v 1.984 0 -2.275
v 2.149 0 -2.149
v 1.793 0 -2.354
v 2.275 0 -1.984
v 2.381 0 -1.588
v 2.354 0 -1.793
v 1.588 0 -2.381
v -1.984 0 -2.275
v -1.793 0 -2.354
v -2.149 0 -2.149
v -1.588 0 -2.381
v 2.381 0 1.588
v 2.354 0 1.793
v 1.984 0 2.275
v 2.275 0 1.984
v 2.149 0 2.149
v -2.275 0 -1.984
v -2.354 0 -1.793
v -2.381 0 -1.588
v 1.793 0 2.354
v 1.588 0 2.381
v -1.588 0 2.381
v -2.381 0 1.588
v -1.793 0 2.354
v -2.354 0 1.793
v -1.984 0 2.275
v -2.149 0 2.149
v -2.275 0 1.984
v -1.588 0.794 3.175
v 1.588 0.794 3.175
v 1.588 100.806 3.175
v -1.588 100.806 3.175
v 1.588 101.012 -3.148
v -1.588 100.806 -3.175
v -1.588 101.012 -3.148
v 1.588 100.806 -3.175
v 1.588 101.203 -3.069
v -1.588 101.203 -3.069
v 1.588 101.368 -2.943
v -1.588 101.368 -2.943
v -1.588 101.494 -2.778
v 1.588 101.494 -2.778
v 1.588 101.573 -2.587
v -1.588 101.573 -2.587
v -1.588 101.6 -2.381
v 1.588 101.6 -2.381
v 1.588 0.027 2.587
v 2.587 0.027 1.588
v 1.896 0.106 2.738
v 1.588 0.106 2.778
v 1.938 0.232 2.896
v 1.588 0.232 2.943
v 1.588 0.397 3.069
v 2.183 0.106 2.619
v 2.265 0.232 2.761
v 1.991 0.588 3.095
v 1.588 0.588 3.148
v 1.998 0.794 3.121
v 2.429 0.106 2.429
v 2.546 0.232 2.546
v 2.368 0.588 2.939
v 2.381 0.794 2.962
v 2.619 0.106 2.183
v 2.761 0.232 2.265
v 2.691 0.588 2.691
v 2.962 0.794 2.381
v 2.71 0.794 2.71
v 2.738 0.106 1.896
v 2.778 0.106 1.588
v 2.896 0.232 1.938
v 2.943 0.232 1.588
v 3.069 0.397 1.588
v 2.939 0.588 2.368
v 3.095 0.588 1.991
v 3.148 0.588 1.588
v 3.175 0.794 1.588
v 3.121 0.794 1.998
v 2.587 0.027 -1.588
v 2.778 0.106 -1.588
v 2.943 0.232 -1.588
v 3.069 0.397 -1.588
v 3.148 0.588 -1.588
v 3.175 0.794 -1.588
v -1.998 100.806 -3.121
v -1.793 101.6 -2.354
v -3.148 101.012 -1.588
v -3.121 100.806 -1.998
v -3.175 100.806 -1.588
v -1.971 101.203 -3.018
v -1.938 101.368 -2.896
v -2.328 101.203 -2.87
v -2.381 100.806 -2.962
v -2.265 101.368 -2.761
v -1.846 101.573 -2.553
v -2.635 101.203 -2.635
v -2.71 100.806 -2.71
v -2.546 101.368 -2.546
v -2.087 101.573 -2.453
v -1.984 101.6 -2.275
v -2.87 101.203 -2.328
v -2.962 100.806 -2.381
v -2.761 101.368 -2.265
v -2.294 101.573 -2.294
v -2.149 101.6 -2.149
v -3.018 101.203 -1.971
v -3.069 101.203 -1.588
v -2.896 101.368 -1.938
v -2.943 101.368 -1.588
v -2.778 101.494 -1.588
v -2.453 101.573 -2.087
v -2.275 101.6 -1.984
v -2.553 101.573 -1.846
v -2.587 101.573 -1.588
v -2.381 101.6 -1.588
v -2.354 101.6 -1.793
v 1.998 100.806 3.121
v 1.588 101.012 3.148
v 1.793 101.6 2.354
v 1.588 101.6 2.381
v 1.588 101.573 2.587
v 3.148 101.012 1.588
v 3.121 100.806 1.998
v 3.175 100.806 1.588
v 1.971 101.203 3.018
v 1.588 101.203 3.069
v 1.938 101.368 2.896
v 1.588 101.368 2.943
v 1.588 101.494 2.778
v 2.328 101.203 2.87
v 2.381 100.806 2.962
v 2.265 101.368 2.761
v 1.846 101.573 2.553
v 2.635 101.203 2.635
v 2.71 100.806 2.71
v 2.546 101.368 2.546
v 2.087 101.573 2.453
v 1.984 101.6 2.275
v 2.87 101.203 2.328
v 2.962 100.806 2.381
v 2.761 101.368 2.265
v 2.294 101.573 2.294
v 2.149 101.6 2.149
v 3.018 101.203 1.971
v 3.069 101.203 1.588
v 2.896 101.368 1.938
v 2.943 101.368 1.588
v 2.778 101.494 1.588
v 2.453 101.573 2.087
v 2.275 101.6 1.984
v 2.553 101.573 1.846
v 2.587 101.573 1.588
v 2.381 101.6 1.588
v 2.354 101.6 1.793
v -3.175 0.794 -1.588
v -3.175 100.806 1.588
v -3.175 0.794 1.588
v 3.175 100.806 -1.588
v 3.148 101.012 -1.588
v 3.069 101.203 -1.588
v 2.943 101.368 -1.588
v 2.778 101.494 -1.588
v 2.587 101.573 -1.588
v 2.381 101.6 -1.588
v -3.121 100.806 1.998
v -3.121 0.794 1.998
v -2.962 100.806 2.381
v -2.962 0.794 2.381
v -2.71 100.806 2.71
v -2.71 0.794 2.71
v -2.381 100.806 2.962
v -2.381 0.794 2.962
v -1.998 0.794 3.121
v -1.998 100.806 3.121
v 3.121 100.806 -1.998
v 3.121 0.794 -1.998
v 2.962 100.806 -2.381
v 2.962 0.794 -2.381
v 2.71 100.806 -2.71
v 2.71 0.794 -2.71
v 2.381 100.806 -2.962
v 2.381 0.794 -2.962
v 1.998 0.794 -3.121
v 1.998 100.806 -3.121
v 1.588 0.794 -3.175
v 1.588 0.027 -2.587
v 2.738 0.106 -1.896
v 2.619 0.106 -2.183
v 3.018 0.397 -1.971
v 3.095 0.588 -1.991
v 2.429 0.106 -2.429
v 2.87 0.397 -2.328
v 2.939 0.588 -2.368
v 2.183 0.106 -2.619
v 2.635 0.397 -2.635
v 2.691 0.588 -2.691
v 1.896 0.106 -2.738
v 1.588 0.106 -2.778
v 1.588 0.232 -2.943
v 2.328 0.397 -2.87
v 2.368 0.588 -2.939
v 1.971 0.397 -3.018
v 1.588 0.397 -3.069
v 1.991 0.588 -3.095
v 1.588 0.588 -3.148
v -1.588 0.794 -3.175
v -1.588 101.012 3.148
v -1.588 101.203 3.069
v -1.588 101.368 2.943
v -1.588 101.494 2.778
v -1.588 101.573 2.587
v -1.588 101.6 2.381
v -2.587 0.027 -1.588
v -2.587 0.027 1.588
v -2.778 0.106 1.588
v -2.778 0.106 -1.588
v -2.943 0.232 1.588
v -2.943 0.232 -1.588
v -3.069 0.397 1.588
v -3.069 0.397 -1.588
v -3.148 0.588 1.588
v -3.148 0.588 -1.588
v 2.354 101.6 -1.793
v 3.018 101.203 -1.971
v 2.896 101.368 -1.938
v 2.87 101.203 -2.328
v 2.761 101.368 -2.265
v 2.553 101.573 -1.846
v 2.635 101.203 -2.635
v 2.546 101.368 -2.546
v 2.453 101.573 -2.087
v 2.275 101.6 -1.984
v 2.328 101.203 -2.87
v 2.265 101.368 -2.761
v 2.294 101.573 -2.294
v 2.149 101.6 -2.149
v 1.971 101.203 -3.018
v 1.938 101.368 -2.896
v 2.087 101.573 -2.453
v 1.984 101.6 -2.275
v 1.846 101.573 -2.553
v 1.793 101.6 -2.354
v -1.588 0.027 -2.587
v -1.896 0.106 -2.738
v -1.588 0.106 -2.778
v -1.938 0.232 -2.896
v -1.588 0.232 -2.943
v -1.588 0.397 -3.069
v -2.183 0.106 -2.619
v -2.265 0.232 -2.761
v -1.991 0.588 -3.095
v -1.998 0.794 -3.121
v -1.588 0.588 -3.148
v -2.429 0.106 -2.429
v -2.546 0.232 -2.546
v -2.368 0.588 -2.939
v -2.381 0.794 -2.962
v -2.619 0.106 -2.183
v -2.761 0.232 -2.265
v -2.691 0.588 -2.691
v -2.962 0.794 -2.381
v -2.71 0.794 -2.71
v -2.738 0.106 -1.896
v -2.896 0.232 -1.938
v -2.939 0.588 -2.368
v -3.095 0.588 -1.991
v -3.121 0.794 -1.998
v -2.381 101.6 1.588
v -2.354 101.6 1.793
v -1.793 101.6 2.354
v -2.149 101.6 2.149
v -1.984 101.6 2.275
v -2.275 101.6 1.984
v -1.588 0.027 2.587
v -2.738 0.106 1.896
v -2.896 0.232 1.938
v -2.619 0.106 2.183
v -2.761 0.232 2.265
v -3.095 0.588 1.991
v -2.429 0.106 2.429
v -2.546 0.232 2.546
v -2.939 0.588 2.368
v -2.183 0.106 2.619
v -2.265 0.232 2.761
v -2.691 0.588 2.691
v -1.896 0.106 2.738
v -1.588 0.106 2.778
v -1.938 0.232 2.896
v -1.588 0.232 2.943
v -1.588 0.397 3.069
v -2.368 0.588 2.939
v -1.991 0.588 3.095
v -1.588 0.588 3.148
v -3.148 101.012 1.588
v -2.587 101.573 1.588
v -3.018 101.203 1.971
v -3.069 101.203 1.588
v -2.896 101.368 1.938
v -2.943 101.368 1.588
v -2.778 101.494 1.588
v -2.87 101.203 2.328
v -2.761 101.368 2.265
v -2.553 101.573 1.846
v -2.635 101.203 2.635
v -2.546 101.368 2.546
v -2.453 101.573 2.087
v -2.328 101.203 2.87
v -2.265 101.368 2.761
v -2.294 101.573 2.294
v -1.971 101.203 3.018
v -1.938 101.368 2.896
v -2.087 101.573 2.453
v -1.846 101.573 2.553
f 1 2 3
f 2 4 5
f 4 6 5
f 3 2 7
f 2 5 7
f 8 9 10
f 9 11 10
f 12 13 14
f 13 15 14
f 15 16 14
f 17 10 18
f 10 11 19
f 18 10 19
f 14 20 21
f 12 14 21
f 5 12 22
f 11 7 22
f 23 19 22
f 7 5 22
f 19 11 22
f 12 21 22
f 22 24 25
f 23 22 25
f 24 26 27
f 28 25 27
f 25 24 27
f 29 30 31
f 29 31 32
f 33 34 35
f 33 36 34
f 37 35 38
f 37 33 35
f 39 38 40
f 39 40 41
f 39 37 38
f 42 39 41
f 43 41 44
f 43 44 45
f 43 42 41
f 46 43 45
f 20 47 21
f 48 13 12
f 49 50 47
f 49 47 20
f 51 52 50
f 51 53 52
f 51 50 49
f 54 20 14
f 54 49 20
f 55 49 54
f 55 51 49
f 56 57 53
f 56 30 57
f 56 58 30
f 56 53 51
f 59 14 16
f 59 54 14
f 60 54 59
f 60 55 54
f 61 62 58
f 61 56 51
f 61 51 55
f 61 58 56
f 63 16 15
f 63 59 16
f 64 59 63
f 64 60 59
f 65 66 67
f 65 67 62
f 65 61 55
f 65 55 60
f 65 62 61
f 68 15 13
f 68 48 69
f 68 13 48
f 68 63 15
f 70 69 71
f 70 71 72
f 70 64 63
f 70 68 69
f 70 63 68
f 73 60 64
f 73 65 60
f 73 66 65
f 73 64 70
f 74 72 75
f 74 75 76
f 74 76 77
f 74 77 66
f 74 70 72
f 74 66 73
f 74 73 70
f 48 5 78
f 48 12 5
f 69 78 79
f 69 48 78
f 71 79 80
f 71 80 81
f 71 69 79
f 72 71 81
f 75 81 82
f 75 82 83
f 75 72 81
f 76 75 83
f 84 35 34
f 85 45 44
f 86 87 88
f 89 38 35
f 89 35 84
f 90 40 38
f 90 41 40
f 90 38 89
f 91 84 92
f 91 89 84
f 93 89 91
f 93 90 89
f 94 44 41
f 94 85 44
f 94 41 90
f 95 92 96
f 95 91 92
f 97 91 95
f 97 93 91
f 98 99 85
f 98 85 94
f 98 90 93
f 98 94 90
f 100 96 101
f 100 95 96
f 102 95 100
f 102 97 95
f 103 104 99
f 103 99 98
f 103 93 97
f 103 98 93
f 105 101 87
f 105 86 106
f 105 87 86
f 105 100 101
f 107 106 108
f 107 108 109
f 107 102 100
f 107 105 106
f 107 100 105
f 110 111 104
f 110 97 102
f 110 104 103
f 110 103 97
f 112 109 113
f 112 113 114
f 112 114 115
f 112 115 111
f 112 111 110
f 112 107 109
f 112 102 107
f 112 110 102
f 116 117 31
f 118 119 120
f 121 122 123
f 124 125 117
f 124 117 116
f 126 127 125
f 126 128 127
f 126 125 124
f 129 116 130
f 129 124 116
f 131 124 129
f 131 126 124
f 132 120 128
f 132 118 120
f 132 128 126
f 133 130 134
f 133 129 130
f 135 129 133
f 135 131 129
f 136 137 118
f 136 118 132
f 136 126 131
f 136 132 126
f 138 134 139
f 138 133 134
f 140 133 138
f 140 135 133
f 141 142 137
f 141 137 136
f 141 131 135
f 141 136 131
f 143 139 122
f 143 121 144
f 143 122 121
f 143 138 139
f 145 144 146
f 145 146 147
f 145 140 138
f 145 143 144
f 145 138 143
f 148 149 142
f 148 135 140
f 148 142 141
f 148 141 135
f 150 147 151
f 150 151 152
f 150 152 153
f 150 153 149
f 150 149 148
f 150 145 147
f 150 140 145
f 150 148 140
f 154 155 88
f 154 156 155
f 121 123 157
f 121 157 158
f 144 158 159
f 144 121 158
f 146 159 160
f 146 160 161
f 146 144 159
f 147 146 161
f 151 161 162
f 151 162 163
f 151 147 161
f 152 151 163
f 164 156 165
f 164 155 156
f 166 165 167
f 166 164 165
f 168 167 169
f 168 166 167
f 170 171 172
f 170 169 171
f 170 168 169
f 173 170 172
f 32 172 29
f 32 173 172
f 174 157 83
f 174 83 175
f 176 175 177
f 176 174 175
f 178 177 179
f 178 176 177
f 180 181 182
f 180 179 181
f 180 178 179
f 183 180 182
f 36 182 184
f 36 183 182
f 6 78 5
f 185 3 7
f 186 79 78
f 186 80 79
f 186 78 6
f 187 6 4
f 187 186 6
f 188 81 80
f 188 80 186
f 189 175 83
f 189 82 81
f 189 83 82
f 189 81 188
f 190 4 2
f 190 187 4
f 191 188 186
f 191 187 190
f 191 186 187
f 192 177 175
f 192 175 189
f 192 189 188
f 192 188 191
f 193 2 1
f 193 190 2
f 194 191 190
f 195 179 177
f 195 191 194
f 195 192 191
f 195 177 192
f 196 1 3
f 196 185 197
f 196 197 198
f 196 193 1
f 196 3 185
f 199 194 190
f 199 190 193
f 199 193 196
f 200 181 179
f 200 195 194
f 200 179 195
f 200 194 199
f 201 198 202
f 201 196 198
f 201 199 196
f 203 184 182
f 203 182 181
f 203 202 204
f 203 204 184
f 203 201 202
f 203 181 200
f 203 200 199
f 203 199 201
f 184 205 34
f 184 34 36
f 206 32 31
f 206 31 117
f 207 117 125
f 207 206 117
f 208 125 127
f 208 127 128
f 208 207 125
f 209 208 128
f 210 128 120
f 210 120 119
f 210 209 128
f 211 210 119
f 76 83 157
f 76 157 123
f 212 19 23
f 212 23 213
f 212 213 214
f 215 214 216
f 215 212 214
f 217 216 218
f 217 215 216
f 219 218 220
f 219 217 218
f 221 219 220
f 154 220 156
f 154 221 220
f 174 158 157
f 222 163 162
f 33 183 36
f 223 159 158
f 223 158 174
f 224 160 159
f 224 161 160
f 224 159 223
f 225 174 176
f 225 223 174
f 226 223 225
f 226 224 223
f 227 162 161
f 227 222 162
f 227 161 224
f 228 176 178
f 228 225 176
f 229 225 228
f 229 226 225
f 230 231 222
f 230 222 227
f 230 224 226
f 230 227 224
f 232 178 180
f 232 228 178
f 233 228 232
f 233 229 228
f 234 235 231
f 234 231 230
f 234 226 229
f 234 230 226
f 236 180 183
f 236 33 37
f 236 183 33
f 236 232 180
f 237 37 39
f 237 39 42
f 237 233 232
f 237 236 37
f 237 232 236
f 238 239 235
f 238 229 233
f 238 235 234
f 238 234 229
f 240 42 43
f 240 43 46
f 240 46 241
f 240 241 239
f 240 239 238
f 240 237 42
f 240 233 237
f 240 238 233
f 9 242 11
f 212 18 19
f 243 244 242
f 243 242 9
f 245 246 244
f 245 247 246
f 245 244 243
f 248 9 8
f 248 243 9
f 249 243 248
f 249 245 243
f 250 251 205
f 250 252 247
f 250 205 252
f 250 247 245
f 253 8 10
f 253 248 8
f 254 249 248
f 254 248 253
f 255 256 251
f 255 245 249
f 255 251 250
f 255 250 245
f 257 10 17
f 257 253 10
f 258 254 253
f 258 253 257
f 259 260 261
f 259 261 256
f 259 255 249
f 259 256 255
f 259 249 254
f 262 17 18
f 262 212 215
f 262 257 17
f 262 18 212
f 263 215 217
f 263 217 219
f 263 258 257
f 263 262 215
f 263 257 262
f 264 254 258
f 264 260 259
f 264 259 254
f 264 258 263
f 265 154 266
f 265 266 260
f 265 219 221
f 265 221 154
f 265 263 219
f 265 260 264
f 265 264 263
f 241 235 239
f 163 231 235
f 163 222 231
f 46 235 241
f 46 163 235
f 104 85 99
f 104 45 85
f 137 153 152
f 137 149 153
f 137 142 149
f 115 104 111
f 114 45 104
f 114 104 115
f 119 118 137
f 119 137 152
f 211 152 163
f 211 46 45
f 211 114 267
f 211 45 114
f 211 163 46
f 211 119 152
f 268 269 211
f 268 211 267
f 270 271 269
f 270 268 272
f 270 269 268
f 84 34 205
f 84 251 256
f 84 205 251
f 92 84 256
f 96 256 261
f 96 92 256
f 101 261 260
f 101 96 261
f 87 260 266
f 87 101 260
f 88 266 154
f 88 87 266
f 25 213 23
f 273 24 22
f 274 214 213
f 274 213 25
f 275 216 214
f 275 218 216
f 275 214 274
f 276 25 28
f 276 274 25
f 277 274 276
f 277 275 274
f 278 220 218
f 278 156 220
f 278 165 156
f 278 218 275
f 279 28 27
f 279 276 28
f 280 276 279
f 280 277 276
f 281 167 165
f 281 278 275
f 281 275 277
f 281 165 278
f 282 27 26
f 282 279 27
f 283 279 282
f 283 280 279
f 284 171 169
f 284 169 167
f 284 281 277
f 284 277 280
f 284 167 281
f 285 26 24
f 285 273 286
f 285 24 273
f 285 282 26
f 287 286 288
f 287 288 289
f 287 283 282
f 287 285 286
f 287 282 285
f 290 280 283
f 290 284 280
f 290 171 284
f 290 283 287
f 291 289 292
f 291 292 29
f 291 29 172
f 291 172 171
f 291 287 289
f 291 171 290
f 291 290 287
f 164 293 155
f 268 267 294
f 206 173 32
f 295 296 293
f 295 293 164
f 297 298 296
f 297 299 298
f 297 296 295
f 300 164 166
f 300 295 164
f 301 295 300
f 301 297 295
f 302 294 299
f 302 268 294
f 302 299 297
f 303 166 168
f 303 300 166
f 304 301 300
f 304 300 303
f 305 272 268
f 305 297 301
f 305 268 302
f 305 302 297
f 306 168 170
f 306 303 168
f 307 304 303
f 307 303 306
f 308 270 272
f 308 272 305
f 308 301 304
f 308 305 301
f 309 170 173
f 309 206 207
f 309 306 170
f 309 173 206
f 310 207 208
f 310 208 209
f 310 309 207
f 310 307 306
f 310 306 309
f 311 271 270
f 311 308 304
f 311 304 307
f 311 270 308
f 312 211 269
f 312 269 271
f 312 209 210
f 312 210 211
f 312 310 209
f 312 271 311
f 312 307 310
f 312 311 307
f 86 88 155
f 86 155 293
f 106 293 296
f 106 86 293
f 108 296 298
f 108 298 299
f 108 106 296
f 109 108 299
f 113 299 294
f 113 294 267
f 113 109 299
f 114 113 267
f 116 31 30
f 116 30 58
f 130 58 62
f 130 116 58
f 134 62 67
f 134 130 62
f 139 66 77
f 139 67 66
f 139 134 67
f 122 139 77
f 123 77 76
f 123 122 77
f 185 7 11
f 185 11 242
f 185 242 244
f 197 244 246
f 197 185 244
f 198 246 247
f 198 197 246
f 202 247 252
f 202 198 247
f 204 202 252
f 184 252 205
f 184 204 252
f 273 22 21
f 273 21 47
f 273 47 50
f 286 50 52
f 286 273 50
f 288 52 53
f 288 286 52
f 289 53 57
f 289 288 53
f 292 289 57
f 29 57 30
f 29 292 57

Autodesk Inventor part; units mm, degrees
ref_plane "YZ Plane" through (0, 0, 0) normal (1, 0, 0) x (0, 1, 0)
ref_plane "XZ Plane" through (0, 0, 0) normal (0, 1, 0) x (-1, 0, 0)
ref_plane "XY Plane" through (0, 0, 0) normal (0, 0, 1) x (1, 0, 0)
sketch "Sketch1" plane through (0, 0, 0) normal (0, 1, 0) x (-1, 0, 0)
  line L0 (3.175, -3.175) -> (-3.175, -3.175)
  line L1 (-3.175, -3.175) -> (-3.175, 3.175)
  line L2 (-3.175, 3.175) -> (3.175, 3.175)
  line L3 (3.175, 3.175) -> (3.175, -3.175)
  line L4 (3.175, -3.175) -> (-3.175, 3.175) construction
  line L5 (-3.175, -3.175) -> (3.175, 3.175) construction
  point P0 (0, 0)
  dimension "d0" = 6.35
  dimension "d1" = 6.35
extrude "Extrusion1" add sketch "Sketch1" along normal blind 101.6
fillet "Fillet1" radius 1.5875 4 edges at (3.175, 50.8, -3.175) (3.175, 50.8, 3.175) (-3.175, 50.8, -3.175) (-3.175, 50.8, 3.175)
fillet "Fillet2" radius 0.7937 16 edges at (3.175, 0, 0) (2.71, 0, -2.71) (0, 0, -3.175) (-2.71, 0, -2.71) (-3.175, 0, 0) (-2.71, 0, 2.71) (0, 0, 3.175) (2.71, 0, 2.71) (2.71, 101.6, -2.71) (0, 101.6, -3.175) (-2.71, 101.6, -2.71) (-3.175, 101.6, 0) (-2.71, 101.6, 2.71) (0, 101.6, 3.175) (2.71, 101.6, 2.71) (3.175, 101.6, 0)
properties part number "4 inch" material "Stainless Steel"
